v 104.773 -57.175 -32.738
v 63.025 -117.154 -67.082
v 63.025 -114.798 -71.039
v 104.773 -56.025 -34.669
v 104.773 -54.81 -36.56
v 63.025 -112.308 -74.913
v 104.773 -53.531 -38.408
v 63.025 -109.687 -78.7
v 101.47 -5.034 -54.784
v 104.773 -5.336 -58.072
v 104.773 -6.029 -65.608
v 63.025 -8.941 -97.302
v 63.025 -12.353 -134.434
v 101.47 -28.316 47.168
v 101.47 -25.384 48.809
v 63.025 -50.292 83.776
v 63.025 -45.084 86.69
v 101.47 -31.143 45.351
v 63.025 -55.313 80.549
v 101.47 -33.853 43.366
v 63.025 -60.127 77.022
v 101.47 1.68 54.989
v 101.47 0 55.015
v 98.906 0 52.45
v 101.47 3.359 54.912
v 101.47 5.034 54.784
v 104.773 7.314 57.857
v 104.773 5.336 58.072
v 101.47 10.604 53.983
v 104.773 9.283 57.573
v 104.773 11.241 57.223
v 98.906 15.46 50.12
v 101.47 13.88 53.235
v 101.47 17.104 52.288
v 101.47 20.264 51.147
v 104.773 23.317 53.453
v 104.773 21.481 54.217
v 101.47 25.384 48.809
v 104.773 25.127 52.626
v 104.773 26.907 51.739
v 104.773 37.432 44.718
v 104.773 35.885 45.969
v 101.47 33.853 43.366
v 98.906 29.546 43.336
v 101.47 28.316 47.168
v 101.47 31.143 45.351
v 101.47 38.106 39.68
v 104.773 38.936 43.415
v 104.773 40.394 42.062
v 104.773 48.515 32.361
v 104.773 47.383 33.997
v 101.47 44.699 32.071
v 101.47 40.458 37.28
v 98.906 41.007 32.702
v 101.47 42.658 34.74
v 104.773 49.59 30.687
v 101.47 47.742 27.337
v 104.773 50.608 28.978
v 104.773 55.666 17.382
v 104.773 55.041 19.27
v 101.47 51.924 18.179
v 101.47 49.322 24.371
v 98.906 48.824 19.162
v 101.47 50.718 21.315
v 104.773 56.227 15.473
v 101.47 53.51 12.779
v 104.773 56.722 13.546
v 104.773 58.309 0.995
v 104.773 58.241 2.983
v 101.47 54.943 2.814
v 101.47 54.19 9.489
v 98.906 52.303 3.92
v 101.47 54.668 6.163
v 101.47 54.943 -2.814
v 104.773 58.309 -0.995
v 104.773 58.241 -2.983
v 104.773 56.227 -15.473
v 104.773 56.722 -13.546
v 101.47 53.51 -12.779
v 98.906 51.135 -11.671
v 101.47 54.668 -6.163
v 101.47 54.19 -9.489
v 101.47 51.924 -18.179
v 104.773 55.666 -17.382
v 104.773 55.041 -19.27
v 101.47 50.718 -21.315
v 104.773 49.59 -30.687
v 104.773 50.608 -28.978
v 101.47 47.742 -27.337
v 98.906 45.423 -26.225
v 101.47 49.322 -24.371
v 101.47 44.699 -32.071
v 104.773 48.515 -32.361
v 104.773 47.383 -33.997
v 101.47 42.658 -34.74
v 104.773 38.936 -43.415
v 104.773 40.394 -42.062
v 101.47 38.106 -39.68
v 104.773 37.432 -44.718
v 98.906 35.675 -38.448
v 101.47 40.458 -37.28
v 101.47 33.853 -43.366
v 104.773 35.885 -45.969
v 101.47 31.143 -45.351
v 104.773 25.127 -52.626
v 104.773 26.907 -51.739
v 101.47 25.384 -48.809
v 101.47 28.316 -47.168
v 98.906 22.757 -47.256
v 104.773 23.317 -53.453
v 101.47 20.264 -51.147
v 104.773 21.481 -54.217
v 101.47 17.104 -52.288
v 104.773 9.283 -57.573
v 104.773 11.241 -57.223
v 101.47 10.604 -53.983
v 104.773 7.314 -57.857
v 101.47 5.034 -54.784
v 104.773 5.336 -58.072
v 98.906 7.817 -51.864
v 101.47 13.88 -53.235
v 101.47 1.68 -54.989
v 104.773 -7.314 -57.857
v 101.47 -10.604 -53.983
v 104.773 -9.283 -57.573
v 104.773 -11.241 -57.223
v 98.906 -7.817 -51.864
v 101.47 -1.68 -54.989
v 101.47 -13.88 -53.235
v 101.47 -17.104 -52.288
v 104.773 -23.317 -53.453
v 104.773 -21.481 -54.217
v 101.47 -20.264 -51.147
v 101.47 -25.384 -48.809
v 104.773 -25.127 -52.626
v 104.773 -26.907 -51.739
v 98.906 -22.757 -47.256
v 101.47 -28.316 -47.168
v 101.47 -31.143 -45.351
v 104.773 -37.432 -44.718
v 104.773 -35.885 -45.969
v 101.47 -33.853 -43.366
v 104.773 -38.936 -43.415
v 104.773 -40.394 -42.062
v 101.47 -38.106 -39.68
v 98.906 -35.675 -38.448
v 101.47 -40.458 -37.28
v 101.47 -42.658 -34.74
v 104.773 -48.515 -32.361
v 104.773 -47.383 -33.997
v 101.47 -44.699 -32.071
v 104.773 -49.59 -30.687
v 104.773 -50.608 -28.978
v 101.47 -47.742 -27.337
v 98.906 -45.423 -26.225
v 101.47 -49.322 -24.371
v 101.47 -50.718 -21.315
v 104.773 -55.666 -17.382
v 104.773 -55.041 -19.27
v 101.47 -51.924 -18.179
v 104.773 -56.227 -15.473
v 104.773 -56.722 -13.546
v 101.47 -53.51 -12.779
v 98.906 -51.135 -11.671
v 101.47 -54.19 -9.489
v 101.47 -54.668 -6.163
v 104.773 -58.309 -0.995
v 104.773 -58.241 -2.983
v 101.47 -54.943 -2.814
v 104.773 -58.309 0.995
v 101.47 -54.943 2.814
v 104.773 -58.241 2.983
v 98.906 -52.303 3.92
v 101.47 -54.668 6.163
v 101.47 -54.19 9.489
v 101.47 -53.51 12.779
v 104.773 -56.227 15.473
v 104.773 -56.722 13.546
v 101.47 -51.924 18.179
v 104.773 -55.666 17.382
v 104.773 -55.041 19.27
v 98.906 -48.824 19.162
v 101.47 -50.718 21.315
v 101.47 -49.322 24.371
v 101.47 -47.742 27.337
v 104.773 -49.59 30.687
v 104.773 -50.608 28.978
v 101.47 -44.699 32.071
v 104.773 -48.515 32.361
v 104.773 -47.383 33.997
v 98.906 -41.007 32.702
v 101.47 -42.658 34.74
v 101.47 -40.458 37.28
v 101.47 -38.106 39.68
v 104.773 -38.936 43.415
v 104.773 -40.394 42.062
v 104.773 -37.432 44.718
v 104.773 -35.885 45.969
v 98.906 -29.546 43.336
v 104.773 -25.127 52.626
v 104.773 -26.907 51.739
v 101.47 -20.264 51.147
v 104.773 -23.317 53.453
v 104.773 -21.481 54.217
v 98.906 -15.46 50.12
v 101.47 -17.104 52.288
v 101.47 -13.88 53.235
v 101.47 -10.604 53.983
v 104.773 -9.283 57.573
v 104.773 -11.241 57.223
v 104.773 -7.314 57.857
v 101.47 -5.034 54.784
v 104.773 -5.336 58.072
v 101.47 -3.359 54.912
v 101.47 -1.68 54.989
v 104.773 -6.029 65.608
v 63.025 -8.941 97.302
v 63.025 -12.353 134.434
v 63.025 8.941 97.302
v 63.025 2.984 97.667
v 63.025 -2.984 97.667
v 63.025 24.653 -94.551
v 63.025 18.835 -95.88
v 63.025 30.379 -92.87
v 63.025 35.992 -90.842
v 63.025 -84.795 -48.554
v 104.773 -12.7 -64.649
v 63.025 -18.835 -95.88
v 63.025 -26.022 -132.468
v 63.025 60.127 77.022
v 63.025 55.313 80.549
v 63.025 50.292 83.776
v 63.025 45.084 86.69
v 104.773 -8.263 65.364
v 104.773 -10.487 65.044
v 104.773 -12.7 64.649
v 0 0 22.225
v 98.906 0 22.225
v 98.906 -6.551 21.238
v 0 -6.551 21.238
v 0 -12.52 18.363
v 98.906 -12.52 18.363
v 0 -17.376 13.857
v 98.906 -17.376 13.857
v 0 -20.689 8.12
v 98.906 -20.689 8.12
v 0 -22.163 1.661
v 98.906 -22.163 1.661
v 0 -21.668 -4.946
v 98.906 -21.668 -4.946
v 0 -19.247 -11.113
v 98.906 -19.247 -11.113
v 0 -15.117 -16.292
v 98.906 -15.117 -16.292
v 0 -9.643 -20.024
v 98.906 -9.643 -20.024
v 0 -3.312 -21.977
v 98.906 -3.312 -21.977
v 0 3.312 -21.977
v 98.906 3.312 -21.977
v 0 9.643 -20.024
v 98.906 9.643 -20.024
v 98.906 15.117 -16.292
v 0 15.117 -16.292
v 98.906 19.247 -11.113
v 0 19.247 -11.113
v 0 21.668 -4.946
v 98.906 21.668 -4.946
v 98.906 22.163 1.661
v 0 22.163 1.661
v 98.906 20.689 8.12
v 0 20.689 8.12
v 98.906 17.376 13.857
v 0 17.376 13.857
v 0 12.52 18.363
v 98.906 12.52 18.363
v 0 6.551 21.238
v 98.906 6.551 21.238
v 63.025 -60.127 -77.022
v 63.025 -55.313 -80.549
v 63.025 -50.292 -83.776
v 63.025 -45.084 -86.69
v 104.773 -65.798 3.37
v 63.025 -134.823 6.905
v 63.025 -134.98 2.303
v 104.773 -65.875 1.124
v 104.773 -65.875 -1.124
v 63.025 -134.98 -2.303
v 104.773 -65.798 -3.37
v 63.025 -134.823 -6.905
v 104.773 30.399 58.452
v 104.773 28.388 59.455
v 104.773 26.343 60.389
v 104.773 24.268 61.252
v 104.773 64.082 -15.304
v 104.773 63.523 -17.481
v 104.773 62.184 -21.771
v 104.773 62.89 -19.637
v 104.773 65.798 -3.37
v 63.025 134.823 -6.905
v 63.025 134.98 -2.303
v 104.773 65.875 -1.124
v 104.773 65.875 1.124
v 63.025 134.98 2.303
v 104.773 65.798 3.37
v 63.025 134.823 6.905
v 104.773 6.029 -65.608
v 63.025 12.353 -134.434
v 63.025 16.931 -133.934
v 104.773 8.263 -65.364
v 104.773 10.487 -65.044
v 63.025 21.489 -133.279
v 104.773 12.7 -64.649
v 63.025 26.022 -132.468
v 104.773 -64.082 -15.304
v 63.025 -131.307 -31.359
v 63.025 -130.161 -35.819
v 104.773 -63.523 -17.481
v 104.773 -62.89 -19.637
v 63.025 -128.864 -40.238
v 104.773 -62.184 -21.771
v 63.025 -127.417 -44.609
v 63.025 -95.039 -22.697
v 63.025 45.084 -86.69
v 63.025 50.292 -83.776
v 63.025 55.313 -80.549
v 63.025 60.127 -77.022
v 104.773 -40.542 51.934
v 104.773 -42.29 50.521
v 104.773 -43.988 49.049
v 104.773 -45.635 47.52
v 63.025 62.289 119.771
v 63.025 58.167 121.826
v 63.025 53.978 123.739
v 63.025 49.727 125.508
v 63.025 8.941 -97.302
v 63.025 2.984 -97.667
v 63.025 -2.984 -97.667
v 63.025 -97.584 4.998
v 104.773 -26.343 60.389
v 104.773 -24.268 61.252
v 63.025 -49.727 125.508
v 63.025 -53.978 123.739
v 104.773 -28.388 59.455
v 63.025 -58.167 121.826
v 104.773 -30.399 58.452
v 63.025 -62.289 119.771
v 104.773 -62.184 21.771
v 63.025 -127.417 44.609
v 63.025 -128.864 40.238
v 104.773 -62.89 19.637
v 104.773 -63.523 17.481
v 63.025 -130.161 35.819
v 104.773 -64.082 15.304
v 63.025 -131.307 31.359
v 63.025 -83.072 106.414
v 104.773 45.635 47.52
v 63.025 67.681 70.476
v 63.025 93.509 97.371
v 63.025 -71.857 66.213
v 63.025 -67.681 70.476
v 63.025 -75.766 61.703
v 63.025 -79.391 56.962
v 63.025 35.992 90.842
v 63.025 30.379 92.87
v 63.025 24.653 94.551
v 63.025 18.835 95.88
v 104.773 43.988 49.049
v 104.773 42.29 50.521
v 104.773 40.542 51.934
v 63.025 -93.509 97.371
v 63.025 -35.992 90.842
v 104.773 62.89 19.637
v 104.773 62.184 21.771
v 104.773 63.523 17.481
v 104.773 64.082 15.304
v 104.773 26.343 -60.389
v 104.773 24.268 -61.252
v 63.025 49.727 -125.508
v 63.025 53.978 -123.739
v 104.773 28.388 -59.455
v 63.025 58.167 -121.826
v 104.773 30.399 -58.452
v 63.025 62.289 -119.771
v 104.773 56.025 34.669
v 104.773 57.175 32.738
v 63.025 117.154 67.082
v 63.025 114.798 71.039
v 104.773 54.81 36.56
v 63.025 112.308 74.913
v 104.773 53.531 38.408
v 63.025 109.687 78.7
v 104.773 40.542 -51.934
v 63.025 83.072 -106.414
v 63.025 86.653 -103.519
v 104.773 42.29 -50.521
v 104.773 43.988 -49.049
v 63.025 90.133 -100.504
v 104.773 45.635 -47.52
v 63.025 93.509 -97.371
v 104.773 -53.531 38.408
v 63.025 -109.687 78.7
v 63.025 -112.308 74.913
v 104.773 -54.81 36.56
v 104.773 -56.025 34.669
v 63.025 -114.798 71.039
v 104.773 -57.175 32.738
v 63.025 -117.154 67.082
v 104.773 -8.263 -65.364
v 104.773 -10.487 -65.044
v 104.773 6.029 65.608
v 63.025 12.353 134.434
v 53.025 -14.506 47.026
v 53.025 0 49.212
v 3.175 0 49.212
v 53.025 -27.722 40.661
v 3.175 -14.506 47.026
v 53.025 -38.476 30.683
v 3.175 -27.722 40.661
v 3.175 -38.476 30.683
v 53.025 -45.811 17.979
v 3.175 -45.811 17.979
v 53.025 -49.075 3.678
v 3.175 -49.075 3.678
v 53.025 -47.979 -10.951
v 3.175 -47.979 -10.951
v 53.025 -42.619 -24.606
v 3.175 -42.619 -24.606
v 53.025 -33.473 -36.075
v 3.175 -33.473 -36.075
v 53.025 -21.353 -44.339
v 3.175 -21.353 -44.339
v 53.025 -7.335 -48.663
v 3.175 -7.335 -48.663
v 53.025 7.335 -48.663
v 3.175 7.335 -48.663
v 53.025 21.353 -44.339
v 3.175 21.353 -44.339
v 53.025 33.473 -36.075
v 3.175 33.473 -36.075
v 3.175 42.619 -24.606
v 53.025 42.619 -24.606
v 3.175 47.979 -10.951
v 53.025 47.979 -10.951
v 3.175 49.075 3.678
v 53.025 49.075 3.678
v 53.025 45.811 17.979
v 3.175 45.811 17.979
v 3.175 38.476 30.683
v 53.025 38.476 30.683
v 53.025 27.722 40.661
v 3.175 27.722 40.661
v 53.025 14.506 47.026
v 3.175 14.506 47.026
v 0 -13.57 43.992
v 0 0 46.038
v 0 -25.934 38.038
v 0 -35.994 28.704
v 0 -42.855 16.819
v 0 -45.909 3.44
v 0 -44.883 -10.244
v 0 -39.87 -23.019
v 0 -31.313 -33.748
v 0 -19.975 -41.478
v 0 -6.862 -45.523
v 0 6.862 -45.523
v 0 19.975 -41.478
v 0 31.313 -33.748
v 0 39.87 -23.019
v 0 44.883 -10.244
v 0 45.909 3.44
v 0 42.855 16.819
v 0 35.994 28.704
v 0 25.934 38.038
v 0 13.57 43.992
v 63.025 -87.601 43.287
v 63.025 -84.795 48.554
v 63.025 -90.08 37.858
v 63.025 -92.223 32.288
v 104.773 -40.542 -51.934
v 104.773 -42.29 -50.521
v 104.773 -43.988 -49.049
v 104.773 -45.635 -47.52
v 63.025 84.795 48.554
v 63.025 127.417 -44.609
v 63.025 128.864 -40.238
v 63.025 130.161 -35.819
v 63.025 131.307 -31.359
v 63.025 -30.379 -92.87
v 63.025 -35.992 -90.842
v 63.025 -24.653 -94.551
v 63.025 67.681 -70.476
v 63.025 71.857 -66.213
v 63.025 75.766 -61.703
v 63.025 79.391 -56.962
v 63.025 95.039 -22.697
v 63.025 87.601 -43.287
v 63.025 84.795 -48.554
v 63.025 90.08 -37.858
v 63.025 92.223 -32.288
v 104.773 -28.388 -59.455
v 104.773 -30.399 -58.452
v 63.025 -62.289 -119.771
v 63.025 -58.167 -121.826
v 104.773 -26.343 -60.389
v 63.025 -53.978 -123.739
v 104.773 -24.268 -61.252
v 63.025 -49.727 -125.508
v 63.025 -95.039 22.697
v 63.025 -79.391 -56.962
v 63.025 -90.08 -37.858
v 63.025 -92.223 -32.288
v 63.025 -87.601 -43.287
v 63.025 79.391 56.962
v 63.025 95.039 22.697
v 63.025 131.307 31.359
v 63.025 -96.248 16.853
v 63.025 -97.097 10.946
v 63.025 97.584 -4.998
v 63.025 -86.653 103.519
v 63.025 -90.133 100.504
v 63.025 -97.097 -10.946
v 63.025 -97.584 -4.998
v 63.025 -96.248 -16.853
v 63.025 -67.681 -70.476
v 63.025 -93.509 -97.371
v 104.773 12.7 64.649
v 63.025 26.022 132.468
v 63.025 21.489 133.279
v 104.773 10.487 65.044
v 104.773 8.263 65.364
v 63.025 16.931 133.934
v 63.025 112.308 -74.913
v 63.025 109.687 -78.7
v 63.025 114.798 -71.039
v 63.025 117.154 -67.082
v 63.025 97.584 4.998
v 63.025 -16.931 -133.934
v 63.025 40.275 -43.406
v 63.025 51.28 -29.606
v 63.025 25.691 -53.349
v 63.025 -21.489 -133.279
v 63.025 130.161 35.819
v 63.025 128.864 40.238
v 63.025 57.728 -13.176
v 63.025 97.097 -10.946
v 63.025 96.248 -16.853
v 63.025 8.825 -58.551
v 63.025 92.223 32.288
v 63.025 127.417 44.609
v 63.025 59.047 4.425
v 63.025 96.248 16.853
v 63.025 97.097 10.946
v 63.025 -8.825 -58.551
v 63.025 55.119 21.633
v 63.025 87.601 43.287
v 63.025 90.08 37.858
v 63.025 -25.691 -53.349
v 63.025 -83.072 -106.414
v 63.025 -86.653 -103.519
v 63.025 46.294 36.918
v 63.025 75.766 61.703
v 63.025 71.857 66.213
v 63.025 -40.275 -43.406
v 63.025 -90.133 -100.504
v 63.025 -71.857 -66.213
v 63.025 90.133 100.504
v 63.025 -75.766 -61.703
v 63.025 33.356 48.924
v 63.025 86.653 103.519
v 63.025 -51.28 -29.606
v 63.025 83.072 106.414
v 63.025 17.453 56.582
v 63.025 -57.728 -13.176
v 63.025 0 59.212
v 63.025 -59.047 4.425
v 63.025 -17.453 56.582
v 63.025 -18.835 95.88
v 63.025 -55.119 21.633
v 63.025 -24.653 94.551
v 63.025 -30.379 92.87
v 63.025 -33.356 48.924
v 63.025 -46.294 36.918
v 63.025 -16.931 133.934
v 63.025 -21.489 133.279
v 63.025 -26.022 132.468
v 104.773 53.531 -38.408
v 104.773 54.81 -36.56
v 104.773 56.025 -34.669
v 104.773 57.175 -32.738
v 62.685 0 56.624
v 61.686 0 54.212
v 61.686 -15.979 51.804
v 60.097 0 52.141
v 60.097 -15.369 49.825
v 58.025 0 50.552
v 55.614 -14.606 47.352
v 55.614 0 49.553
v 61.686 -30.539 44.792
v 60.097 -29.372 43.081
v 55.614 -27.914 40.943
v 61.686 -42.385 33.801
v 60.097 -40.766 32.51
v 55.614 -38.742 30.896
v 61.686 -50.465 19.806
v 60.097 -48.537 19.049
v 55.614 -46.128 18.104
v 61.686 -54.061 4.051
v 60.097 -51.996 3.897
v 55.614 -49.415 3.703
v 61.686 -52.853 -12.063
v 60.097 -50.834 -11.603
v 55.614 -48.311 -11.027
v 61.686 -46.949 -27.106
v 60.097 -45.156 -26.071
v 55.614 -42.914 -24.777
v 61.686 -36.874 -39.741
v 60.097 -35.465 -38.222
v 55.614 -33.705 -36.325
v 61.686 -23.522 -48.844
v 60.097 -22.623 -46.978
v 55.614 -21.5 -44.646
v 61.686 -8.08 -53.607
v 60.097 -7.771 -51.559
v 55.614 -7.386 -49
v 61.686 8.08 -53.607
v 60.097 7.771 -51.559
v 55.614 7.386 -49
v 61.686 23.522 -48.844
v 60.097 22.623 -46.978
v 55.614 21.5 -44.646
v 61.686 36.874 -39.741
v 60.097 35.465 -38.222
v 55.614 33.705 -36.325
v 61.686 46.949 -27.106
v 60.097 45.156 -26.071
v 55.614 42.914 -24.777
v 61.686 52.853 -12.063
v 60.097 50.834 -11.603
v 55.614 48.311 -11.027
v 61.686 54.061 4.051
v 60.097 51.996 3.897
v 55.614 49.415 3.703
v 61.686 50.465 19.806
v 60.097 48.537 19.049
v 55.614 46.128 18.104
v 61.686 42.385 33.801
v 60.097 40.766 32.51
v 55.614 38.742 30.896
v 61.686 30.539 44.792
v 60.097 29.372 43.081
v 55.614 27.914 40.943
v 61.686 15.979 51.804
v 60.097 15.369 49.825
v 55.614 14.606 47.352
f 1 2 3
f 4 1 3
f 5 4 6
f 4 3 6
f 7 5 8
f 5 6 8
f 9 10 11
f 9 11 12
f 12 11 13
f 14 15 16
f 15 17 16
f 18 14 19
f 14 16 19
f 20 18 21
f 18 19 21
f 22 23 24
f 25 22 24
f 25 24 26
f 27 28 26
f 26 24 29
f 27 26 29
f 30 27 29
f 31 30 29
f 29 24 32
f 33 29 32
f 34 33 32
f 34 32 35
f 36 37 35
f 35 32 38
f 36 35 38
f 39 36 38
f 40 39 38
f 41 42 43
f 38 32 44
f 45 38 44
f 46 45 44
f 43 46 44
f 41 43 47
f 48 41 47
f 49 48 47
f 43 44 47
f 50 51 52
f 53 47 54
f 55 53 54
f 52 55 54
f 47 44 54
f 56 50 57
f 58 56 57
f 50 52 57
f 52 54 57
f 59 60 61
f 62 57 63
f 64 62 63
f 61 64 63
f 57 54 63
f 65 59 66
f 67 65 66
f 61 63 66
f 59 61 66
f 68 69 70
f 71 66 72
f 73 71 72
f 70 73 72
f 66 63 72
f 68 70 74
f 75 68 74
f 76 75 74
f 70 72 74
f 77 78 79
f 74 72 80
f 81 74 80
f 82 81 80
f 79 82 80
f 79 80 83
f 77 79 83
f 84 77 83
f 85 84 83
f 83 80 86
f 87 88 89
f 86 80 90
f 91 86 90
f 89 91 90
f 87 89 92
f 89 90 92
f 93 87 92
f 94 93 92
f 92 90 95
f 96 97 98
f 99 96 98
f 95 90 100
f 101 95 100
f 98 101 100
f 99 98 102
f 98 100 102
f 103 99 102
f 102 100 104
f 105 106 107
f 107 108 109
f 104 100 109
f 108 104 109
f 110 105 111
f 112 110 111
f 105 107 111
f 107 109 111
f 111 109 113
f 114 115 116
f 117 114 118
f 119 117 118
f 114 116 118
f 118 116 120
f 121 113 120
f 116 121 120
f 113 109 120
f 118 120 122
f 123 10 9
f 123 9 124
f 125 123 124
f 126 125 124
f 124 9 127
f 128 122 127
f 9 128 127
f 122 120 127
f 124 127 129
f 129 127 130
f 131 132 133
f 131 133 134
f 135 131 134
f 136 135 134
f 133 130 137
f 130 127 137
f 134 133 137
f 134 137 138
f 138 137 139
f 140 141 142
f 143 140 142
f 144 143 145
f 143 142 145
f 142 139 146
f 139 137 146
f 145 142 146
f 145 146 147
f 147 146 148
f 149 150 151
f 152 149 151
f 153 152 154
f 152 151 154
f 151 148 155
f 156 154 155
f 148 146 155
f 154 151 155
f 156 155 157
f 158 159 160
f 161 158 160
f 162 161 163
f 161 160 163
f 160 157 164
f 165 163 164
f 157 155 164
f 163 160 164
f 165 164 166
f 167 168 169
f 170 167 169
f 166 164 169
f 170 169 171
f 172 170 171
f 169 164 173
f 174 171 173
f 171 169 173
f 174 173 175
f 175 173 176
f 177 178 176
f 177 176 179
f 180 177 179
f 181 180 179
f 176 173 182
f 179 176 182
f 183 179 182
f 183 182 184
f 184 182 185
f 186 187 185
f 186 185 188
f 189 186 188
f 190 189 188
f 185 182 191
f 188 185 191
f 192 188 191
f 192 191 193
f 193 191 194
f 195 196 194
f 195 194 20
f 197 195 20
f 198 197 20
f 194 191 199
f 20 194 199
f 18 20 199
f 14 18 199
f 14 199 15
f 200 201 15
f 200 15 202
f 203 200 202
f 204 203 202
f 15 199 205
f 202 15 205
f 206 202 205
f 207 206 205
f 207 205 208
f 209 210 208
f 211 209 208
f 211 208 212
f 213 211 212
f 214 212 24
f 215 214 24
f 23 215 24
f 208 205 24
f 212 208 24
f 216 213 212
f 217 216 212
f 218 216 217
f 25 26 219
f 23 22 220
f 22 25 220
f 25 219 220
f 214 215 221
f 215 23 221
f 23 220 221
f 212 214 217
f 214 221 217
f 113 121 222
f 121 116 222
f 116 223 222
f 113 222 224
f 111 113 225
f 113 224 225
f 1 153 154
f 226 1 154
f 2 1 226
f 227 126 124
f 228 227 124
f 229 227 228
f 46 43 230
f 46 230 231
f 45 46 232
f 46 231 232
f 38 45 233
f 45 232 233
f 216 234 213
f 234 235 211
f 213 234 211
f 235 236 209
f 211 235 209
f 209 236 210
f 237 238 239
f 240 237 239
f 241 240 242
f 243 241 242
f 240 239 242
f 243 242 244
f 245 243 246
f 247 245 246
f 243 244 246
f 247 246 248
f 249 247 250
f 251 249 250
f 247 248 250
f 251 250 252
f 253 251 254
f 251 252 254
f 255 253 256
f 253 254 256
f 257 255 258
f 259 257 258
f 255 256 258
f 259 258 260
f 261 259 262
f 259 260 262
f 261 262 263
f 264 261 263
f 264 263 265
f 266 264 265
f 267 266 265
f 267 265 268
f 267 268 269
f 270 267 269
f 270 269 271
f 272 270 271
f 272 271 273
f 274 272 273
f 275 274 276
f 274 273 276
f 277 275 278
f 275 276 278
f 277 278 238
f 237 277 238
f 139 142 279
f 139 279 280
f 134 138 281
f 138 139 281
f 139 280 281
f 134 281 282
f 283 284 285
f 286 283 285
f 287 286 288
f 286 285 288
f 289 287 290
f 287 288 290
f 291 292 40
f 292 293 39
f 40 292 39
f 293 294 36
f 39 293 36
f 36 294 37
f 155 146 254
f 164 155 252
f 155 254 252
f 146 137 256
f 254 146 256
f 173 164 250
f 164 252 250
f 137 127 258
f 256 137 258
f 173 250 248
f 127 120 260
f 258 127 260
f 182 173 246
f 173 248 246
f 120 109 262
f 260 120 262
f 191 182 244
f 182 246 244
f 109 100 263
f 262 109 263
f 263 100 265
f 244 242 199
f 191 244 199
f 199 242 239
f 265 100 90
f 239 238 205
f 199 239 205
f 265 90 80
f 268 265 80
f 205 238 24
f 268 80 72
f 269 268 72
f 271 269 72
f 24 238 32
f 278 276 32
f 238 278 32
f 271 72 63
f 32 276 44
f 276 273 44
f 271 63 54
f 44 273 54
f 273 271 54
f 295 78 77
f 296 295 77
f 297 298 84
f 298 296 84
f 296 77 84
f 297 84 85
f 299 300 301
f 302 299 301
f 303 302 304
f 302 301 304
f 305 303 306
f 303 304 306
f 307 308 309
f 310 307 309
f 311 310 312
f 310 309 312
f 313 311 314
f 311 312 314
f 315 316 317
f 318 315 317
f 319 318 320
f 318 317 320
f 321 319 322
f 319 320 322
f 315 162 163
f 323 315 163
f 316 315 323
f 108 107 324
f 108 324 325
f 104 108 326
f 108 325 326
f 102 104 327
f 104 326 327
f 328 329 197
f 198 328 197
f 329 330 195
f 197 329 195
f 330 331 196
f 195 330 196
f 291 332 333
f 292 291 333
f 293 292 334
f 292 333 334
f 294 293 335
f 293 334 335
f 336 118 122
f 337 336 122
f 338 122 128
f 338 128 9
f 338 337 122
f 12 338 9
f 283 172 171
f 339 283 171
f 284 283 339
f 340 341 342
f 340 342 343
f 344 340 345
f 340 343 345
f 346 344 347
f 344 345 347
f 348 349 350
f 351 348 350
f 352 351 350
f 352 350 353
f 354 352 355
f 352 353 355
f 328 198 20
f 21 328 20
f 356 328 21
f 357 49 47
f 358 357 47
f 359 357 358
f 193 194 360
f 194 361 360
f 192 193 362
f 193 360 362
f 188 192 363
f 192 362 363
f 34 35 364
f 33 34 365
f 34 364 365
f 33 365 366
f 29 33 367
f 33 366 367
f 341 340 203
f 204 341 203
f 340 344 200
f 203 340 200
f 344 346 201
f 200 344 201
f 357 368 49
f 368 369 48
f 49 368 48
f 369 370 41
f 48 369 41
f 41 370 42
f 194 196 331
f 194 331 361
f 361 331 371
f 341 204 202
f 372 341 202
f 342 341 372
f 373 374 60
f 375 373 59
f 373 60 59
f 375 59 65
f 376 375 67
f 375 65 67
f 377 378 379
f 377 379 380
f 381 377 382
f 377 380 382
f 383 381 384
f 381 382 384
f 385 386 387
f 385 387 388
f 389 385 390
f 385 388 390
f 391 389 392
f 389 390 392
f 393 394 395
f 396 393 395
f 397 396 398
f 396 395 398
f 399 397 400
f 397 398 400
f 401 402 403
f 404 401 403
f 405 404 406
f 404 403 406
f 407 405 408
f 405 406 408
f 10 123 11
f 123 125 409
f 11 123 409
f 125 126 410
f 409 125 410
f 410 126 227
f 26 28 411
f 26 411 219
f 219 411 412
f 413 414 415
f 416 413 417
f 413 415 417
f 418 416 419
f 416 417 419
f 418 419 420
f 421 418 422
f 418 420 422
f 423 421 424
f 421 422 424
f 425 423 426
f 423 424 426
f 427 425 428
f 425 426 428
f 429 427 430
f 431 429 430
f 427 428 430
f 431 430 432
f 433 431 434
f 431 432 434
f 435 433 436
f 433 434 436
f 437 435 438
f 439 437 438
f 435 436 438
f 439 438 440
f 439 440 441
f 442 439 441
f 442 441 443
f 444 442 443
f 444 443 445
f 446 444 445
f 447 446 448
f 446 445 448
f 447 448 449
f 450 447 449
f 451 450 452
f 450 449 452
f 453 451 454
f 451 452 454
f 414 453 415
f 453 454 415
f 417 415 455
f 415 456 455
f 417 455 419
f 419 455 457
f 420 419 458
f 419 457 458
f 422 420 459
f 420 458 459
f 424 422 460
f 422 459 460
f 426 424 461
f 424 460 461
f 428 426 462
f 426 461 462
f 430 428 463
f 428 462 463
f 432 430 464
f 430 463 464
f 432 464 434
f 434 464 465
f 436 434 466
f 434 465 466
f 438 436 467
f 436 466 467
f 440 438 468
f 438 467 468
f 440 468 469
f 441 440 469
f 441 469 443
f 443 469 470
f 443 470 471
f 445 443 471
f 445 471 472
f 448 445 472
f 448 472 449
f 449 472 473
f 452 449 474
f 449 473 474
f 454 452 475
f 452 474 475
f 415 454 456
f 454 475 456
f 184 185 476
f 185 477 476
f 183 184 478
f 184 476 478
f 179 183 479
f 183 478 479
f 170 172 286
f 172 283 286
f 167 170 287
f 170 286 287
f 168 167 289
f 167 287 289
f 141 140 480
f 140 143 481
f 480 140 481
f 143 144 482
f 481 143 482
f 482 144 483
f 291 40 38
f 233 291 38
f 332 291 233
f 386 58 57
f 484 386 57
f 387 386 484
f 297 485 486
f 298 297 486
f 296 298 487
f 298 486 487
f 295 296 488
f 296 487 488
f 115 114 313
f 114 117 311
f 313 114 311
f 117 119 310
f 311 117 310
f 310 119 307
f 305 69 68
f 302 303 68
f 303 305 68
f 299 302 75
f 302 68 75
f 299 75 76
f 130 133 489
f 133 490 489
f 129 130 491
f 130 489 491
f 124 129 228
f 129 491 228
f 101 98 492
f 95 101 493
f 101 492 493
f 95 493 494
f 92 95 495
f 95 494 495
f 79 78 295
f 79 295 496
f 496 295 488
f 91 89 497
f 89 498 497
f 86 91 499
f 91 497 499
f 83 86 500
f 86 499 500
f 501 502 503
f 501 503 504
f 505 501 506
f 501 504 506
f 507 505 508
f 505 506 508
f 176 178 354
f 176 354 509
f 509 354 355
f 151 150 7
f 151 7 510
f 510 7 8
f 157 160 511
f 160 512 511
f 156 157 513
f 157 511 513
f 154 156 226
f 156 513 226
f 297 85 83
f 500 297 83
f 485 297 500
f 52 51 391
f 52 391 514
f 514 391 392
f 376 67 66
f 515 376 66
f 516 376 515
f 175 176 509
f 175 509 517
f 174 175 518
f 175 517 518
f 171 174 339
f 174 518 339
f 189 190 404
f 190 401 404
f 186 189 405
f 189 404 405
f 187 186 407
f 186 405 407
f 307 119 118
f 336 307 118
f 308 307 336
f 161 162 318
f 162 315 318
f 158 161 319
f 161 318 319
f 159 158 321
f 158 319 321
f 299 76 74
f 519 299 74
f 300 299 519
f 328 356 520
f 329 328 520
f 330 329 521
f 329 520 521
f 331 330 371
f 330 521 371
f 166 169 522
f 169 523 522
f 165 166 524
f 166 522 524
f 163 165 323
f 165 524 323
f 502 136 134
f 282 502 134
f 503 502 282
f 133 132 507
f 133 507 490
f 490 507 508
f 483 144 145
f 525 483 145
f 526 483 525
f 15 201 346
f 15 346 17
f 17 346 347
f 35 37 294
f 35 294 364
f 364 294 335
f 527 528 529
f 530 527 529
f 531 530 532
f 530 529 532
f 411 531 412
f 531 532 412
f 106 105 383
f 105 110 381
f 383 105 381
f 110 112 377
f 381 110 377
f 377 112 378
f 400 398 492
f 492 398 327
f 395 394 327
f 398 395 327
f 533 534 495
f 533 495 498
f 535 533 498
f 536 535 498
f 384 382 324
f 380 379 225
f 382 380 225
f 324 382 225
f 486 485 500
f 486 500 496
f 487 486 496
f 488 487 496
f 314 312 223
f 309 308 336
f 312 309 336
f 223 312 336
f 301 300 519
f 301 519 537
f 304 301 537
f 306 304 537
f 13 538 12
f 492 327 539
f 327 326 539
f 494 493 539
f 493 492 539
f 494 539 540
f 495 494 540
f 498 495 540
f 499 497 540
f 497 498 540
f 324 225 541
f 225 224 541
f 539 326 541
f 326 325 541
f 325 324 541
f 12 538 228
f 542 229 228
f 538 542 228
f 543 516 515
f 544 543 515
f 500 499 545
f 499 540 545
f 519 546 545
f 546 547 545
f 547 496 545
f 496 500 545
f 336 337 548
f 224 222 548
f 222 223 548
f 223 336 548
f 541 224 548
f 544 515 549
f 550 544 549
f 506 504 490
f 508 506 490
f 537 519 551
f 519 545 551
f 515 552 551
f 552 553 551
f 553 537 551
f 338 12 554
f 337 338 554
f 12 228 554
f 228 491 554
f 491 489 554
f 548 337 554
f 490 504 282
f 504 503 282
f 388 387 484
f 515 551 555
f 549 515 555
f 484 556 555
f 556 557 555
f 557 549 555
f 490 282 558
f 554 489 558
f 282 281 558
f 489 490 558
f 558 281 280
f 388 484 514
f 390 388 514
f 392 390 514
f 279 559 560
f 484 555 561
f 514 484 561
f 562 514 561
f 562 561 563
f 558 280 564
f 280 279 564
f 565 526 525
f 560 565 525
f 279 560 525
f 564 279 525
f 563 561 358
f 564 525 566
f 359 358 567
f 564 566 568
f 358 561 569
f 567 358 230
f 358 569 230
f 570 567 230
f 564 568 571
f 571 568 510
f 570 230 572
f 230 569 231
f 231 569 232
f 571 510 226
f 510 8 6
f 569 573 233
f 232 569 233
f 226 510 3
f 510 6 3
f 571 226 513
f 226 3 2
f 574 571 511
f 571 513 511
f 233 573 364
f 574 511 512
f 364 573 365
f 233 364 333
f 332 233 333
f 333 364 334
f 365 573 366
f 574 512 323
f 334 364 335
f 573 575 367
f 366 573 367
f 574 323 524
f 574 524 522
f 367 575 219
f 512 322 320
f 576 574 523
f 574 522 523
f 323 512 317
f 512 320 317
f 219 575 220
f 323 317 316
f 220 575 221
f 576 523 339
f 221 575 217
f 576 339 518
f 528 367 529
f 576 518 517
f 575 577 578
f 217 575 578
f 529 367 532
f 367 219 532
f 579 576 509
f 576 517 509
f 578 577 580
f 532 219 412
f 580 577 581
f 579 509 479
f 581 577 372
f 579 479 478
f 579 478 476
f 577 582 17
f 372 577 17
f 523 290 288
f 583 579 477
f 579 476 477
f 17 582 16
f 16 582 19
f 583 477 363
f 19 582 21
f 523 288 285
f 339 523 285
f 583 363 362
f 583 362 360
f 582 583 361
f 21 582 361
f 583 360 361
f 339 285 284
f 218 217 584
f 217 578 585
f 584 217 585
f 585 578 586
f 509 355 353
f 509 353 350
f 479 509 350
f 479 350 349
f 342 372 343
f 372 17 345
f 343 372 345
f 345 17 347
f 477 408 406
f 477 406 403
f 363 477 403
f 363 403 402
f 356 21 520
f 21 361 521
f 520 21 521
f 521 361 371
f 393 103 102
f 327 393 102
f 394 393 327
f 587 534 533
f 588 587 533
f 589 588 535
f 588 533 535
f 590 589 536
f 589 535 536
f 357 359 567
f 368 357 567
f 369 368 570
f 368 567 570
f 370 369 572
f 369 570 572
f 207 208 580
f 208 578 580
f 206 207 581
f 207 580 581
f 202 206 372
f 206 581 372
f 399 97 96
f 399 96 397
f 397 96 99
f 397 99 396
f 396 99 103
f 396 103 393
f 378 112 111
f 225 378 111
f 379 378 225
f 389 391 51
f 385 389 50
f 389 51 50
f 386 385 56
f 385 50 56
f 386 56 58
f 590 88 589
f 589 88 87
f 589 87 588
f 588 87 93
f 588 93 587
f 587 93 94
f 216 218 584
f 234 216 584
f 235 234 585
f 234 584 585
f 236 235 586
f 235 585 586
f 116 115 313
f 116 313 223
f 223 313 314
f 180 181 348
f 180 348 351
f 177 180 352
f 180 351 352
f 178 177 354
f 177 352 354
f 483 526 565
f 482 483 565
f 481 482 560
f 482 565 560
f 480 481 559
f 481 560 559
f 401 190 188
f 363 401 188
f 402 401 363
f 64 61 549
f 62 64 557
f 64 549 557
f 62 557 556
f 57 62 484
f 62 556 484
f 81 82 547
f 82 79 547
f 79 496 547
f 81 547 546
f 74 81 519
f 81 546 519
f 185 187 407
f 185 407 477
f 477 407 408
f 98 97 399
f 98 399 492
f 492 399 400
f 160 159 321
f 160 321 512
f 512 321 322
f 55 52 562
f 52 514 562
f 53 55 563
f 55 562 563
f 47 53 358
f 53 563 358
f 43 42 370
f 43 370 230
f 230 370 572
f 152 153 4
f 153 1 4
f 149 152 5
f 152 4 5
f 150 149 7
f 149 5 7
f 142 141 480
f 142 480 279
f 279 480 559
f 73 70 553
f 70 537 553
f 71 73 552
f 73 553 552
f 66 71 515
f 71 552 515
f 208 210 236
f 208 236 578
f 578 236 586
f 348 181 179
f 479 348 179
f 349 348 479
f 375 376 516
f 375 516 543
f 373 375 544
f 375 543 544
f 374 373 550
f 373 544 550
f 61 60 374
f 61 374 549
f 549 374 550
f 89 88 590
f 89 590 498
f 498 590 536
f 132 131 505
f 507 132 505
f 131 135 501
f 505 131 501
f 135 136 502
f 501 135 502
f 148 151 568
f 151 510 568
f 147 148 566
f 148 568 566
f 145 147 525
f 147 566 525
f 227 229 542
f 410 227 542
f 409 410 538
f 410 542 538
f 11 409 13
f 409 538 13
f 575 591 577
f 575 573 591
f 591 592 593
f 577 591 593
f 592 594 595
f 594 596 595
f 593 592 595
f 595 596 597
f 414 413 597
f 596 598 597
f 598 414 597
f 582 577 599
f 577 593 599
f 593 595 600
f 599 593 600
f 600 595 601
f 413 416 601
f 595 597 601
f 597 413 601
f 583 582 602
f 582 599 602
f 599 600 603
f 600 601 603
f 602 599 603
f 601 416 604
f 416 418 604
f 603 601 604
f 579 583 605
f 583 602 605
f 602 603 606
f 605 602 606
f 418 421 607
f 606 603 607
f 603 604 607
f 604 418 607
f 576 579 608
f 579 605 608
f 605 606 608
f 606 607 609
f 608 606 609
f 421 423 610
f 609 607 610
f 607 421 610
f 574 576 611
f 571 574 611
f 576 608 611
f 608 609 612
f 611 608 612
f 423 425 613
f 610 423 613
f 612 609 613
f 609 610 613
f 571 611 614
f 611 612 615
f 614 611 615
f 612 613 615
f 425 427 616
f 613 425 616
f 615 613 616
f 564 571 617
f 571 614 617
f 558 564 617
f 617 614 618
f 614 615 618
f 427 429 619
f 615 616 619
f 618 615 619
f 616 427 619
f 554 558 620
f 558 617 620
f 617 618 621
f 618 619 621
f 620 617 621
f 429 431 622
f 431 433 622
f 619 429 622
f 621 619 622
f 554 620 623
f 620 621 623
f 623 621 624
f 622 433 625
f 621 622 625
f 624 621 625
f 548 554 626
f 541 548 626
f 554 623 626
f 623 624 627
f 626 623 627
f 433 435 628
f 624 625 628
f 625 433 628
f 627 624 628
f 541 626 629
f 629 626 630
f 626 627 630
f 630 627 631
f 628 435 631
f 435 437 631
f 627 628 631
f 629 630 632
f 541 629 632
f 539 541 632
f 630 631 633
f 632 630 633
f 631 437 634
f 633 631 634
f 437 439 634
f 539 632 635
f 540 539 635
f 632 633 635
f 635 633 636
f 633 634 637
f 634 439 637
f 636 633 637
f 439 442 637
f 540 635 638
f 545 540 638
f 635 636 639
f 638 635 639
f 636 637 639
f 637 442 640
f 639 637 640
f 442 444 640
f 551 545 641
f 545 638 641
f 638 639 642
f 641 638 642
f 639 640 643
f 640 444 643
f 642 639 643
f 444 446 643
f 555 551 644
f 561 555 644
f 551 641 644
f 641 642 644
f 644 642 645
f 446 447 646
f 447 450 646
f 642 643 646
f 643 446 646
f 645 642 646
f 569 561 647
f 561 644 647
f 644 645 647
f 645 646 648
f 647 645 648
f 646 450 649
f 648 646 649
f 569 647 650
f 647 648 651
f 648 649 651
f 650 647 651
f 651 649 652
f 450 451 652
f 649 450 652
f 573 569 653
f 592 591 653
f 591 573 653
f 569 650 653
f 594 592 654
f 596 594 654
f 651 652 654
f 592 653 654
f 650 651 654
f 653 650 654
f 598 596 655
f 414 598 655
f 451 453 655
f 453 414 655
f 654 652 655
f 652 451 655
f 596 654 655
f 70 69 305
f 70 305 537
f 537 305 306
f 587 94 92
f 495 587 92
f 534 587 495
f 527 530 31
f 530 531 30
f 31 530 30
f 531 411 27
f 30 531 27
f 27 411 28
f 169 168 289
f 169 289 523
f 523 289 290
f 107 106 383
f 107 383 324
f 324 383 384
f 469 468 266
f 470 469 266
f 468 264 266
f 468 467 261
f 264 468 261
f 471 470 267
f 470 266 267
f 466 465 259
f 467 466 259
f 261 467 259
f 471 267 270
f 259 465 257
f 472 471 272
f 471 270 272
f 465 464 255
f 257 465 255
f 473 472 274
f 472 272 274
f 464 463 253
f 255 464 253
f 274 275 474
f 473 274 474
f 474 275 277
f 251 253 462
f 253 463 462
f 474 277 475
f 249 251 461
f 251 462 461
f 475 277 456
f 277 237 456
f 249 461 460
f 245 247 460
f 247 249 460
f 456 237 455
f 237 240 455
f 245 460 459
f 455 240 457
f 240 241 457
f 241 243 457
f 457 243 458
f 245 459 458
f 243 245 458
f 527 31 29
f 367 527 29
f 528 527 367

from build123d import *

# Parameters (mm, degrees)
CORTE_REVOLU_O2_ANGLE = 10.5
PADR_OCIRCULAR1_COUNT = 22


with BuildPart() as part:
    # Esboço1 → Revolução1 (revolve)
    with BuildSketch(Plane.XY, mode=Mode.PRIVATE) as revolu_o1_sk:
        with BuildLine():
            Line((0, 22.225), (104.772830684, 22.225))
            Line((104.772830684, 22.225), (104.772830684, 65.884431945))
            Line((104.772830684, 65.884431945), (63.025432751, 135))
            Line((63.025432751, 135), (63.025432751, 59.2125))
            ThreePointArc((63.025432751, 59.2125), (60.096500563, 52.141432188), (53.025432751, 49.2125))
            Line((53.025432751, 49.2125), (3.175, 49.2125))
            Line((3.175, 49.2125), (0, 46.0375))
            Line((0, 46.0375), (0, 22.225))
        make_face()
    revolve(revolu_o1_sk.sketch.rotate(Axis((0, 0, 0), (1, 0, 0)), 90), axis=Axis((0, 0, 0), (1, 0, 0)))  # turned: the seam where the file's is

    # Esboço3 → Corte-Revolução2 (revolve, symmetric, cut)
    with BuildSketch(Plane(origin=(0, 0, 0), x_dir=(1, 0, 0), z_dir=(0, 1, 0))) as corte_revolu_o2_sk:
        Polygon((104.772830684, 51.34699923), (63.025432751, 97.712181836), (63.025432751, 135), (111.527529929, 60.313319884), align=None)
    corte_revolu_o2 = revolve(axis=Axis((0, 0, 0), (1, 0, 0)), revolution_arc=CORTE_REVOLU_O2_ANGLE / 2, mode=Mode.SUBTRACT)
    corte_revolu_o2 = corte_revolu_o2 + revolve(corte_revolu_o2_sk.sketch, axis=Axis((0, 0, 0), (-1, 0, 0)), revolution_arc=CORTE_REVOLU_O2_ANGLE / 2, mode=Mode.SUBTRACT)

    # PadrãoCircular1: Corte-Revolução2 ×22 about axis
    padr_ocircular1_axis = Axis((0, 0, 0), (1, 0, 0))
    for i in range(1, PADR_OCIRCULAR1_COUNT):
        add(corte_revolu_o2.rotate(padr_ocircular1_axis, i * 360 / PADR_OCIRCULAR1_COUNT), mode=Mode.SUBTRACT)

    # Esboço2 → Corte-Revolução1 (revolve, cut)
    with BuildSketch(Plane.XY, mode=Mode.PRIVATE) as corte_revolu_o1_sk:
        Polygon((104.905562781, 58.449755058), (98.905562781, 52.449755058), (98.905562781, 18.901389006), (104.905562781, 18.901389006), align=None)
    revolve(corte_revolu_o1_sk.sketch.rotate(Axis((104.772830684, 0, 0), (-1, 0, 0)), 270), axis=Axis((104.772830684, 0, 0), (-1, 0, 0)), mode=Mode.SUBTRACT)  # turned: the seam where the file's is


solid = part.part
